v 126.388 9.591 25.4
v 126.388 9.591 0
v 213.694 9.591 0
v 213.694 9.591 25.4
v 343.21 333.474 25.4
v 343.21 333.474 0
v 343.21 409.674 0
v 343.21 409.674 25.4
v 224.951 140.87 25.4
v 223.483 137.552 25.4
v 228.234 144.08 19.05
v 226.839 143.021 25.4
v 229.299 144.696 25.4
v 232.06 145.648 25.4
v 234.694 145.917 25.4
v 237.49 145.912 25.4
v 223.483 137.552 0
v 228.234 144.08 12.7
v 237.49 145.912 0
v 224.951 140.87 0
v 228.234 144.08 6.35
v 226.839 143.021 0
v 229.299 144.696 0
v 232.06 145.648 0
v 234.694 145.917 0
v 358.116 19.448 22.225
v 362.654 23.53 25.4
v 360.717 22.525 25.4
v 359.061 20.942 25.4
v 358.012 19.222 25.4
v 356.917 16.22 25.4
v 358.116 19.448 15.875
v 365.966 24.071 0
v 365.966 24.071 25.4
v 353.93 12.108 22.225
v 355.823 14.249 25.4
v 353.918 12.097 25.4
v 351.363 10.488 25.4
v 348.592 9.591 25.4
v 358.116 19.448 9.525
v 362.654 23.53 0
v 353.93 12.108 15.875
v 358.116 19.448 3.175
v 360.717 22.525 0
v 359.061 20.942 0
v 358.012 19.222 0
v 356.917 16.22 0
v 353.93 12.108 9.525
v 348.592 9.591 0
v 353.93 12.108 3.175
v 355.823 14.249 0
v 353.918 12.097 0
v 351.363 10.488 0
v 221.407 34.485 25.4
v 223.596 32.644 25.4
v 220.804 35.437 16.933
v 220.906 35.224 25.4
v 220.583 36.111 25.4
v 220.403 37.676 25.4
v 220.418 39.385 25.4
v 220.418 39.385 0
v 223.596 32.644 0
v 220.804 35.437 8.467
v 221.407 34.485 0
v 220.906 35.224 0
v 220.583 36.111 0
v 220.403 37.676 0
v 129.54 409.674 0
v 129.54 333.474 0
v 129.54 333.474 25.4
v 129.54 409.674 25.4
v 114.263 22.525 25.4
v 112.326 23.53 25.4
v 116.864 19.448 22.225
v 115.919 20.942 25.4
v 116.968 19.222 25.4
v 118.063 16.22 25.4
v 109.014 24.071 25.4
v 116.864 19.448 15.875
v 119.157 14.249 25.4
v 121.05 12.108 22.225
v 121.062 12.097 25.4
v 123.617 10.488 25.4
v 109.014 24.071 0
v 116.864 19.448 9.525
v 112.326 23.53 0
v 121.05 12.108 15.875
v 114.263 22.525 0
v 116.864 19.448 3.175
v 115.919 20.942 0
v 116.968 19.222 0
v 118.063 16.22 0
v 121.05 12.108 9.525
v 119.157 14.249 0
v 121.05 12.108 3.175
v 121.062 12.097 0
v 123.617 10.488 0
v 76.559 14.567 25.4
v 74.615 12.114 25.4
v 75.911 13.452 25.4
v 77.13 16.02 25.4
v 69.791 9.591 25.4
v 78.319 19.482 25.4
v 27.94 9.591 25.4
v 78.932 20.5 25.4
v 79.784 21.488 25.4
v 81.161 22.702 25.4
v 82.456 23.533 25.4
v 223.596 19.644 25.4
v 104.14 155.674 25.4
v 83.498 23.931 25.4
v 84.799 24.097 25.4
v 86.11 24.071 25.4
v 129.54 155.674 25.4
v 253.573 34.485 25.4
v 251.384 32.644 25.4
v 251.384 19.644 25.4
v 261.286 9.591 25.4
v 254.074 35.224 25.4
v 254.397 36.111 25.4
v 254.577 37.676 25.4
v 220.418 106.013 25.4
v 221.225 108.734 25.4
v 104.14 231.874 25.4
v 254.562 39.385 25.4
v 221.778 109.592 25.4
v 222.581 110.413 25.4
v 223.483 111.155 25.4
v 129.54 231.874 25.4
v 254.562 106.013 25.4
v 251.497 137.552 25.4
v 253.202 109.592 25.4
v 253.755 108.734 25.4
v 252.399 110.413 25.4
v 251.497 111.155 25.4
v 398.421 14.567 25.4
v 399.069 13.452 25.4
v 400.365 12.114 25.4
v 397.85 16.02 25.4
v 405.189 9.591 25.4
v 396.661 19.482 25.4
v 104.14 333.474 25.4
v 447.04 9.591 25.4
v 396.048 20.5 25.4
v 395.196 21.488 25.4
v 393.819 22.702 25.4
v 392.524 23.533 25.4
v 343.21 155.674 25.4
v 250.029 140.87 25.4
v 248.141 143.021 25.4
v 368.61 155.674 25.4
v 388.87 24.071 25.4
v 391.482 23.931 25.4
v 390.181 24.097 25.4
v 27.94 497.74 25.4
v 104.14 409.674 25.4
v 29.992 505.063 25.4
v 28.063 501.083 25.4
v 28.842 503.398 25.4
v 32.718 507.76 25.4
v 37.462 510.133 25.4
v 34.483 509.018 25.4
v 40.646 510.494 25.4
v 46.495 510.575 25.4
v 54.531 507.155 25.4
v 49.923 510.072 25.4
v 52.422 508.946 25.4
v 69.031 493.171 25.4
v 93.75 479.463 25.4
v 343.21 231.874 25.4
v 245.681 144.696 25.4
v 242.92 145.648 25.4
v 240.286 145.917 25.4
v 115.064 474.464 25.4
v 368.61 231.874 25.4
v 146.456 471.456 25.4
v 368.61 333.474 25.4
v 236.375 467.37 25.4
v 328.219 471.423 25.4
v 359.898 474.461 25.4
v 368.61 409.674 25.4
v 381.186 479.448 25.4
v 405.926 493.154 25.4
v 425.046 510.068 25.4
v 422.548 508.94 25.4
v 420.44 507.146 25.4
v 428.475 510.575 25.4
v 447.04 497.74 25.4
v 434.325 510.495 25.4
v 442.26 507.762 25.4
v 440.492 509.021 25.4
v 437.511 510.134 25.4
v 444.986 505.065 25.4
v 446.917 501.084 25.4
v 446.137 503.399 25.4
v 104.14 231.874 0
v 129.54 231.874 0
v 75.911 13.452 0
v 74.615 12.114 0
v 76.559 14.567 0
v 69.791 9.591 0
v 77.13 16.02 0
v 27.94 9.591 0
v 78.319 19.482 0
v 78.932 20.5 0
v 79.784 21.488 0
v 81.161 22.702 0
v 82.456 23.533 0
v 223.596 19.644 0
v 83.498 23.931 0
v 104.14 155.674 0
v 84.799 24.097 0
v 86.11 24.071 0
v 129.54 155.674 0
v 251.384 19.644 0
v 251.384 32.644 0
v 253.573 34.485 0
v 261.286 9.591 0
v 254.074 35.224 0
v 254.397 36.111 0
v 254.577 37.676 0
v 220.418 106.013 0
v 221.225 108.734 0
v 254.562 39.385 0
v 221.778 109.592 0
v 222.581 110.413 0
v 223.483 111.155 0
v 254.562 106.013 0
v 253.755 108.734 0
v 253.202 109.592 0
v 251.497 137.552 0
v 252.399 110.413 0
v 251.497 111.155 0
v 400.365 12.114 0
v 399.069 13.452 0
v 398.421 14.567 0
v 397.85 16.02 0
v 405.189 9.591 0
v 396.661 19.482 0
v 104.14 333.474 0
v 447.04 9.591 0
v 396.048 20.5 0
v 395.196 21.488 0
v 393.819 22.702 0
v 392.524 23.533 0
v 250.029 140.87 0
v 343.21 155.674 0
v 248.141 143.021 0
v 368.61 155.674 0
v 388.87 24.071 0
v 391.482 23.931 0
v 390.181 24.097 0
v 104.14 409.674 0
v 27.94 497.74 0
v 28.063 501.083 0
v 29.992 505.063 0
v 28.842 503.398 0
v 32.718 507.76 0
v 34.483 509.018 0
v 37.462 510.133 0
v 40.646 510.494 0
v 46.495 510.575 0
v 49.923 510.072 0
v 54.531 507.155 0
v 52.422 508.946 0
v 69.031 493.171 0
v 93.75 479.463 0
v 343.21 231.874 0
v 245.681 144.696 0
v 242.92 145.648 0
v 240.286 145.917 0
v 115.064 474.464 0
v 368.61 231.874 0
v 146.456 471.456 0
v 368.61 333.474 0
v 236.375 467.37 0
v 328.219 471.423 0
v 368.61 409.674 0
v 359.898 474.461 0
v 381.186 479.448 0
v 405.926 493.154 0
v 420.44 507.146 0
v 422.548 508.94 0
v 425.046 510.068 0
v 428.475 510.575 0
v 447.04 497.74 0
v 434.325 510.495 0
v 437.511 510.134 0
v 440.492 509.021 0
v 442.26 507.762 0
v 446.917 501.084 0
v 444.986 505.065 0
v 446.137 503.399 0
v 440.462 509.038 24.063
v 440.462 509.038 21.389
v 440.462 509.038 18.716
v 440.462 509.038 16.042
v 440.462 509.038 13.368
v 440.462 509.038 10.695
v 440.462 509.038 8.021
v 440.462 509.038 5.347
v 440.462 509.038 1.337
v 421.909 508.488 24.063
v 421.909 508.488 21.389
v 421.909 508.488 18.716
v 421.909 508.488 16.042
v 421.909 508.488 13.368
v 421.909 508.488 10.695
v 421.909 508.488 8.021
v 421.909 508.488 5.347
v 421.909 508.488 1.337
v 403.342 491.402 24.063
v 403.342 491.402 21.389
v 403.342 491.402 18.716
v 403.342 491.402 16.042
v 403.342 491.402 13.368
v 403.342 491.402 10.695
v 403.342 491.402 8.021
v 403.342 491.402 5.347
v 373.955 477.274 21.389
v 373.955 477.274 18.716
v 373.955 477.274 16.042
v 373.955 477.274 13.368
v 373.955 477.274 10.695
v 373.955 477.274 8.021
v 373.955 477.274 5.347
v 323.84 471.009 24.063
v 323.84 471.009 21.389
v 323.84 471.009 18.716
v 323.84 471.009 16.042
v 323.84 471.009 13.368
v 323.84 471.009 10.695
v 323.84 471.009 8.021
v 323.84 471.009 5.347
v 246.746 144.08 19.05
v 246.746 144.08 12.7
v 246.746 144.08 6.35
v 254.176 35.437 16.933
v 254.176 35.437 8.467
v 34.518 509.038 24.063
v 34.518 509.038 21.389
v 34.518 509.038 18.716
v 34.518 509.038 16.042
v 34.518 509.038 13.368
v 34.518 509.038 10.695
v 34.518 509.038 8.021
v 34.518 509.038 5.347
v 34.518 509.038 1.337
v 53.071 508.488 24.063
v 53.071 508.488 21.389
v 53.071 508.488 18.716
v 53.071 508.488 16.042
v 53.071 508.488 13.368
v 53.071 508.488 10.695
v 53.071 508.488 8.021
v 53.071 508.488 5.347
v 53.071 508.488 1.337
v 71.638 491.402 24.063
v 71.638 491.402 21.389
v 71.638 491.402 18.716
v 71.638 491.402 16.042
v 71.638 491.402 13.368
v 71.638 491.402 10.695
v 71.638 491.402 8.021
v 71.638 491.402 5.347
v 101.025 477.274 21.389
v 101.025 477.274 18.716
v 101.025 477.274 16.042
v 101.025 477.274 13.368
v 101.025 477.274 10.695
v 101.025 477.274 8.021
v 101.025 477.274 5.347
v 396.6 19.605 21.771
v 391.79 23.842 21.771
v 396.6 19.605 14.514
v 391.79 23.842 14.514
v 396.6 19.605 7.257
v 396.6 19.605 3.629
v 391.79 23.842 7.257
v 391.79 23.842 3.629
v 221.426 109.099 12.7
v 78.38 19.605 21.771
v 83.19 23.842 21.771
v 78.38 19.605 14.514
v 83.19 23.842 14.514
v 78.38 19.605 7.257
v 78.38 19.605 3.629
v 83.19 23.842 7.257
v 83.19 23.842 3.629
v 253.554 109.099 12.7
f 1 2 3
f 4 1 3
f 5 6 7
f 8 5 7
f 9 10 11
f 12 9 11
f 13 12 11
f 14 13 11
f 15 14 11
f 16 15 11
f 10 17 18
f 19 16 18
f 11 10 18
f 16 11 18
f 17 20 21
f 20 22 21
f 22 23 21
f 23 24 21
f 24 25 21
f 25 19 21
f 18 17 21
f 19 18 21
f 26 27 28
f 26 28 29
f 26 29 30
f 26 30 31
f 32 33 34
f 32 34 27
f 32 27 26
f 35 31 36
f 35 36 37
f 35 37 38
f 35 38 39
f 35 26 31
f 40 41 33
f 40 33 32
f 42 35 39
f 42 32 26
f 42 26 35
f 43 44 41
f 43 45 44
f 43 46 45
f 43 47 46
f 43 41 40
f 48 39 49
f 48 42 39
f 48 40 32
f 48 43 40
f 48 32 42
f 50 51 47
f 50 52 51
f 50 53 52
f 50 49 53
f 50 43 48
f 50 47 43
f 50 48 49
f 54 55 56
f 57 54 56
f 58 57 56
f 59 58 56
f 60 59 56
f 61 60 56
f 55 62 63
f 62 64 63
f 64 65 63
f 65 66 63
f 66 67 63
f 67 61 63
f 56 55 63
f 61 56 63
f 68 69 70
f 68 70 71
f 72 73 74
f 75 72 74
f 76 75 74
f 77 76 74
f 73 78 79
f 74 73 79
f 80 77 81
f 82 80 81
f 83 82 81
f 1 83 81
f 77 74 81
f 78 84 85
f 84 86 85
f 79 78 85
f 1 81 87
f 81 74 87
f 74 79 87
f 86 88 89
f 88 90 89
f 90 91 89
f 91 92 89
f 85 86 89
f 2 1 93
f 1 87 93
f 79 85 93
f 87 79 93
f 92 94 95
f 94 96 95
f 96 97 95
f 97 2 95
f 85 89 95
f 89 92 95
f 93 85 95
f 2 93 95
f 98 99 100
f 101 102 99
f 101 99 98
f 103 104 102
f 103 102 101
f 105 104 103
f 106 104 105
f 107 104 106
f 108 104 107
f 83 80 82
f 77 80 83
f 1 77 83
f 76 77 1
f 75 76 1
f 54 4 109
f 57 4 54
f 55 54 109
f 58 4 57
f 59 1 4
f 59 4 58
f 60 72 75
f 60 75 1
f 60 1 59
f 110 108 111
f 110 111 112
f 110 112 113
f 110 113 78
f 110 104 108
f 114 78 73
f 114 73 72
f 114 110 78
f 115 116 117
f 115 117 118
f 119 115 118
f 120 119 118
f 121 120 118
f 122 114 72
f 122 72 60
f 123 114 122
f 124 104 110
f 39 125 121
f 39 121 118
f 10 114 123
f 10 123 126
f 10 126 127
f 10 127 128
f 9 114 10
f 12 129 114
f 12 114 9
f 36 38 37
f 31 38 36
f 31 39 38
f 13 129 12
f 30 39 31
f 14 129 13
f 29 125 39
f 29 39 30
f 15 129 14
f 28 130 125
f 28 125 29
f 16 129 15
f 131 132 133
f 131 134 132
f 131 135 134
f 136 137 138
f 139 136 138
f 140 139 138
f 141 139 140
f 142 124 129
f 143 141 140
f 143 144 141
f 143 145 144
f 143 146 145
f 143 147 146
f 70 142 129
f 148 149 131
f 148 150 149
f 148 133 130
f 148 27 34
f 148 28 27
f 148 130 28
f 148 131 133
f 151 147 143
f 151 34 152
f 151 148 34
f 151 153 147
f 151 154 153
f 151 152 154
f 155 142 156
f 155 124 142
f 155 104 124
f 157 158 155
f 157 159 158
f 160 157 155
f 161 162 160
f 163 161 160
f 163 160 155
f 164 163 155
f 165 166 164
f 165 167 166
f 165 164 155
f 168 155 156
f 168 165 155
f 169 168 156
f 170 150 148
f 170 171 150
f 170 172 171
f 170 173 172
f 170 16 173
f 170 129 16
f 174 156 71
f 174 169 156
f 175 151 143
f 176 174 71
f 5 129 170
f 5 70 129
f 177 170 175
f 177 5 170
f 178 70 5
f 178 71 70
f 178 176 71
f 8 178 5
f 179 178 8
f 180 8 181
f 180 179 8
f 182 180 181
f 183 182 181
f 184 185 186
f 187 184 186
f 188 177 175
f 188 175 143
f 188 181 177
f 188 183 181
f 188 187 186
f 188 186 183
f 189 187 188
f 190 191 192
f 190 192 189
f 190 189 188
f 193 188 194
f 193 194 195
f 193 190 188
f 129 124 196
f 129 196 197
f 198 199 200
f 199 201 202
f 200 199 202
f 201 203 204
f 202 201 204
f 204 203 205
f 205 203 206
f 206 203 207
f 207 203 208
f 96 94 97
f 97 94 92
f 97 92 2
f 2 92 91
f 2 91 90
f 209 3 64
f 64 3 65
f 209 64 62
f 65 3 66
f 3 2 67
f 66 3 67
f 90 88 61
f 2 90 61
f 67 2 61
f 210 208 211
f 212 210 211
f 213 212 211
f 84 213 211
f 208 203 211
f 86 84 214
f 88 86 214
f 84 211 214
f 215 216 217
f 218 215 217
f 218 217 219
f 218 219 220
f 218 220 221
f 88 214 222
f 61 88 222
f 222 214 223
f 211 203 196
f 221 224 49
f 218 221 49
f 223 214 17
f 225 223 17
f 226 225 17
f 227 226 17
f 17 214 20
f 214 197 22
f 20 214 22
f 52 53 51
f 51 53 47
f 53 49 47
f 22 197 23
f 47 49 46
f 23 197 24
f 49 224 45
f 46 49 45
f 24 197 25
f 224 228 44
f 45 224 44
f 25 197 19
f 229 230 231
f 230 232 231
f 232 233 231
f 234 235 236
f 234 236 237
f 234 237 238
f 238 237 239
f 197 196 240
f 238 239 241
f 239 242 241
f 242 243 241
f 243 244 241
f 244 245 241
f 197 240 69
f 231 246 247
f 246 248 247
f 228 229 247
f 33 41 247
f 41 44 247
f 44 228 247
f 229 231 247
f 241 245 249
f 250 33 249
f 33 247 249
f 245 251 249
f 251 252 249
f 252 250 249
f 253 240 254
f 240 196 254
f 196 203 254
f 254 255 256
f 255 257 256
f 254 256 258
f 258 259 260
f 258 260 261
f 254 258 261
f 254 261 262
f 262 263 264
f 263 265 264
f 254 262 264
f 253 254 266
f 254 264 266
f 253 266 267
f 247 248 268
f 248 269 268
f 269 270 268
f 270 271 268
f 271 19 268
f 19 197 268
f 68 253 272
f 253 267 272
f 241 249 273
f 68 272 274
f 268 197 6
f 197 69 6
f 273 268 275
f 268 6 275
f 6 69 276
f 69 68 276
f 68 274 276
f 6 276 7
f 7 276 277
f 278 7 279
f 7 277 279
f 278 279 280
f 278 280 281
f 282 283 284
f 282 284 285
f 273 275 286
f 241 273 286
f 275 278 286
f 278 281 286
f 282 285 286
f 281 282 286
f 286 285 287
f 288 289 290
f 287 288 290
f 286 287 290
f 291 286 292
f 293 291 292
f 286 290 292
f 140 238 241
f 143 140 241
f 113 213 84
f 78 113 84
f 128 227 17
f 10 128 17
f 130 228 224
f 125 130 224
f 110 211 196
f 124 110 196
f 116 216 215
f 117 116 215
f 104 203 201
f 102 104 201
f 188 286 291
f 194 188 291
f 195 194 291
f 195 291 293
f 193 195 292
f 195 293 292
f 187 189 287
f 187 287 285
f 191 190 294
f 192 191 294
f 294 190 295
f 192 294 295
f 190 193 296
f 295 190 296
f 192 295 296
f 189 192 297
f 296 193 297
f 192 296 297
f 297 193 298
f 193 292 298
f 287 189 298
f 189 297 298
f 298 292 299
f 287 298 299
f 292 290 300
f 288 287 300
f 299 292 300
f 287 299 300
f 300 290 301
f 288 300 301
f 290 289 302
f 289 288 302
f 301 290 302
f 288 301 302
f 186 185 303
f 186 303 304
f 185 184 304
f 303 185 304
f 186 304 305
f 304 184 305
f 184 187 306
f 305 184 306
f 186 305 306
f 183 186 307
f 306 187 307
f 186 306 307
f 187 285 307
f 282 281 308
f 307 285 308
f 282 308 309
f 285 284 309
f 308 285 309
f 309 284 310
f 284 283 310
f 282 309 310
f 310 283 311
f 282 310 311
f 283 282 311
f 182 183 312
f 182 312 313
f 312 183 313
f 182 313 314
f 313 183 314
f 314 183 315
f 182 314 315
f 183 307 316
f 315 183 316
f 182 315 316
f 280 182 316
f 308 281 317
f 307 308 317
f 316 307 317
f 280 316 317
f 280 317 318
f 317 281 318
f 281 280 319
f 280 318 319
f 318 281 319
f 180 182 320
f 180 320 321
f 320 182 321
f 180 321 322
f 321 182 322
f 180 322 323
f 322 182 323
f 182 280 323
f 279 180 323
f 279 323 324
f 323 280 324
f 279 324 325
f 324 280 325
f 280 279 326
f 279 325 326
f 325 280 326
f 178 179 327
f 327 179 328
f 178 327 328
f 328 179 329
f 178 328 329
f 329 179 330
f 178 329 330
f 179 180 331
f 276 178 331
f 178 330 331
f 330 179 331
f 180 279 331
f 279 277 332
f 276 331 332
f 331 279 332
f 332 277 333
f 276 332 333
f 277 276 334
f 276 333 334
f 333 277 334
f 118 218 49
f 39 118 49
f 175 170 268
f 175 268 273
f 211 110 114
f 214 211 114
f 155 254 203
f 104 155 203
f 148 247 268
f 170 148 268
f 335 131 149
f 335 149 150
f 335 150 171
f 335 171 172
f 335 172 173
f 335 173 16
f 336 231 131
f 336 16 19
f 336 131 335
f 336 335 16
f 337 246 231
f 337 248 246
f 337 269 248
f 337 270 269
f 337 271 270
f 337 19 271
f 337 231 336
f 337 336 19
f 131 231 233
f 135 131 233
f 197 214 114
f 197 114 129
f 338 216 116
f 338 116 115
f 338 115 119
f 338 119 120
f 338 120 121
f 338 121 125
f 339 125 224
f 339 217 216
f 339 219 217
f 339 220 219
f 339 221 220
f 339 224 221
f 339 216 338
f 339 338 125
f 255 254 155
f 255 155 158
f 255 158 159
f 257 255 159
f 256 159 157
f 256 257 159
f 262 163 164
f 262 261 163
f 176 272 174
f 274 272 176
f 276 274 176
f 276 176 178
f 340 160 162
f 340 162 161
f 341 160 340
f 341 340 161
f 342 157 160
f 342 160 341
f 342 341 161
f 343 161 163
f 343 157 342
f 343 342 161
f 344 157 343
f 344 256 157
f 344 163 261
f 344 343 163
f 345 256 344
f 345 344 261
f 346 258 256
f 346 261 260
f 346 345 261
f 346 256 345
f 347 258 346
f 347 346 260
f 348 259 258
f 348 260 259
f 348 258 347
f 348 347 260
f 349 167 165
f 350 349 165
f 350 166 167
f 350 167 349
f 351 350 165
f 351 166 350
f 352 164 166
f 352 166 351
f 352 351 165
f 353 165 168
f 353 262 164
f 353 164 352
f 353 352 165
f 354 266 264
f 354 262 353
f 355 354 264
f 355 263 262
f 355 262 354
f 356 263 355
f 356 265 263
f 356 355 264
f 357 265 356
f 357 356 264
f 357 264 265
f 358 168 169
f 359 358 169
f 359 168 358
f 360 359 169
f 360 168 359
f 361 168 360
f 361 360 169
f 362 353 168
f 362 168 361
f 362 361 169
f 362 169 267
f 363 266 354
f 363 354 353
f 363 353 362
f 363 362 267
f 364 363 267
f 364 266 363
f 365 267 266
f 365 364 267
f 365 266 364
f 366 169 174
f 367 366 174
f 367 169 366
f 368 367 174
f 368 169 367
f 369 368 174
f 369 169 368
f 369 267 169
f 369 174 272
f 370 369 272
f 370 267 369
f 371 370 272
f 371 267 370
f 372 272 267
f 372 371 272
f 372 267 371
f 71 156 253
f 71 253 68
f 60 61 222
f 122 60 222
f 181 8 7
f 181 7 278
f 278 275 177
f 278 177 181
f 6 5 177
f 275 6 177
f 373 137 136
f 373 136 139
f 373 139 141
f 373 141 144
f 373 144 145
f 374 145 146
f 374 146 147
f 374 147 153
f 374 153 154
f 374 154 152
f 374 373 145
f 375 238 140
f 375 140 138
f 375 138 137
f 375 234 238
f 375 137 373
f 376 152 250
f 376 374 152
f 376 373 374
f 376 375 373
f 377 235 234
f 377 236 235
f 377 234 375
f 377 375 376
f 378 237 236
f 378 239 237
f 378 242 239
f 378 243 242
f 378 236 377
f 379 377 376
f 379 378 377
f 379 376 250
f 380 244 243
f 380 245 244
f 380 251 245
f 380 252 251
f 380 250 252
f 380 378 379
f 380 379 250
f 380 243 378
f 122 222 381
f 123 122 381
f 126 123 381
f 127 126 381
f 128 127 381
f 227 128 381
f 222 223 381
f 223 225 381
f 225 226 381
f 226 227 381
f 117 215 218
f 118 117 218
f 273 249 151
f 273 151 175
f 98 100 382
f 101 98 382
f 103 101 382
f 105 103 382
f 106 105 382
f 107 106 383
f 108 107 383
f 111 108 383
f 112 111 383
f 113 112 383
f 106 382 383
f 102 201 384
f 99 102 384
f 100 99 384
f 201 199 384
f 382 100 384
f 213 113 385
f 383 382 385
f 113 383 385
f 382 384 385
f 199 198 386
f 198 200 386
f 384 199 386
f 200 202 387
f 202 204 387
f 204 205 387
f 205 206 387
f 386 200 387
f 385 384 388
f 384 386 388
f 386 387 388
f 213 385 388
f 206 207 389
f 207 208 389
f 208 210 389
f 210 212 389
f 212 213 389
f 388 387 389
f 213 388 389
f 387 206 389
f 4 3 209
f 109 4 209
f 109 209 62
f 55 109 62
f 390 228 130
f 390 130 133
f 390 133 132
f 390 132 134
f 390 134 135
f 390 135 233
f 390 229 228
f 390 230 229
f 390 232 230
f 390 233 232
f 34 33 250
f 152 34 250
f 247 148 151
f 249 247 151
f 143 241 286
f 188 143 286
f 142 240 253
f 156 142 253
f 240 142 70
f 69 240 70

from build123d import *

# Parameters (mm, degrees)
F0_W     = 25.4
F0_H     = 76.2
F1_DEPTH = 25.4


with BuildPart() as f1:
    # F0 (on Top) → F1 (new body)
    with BuildSketch(Plane.XY):
        with BuildLine():
            Line((27.94, 497.7397918701), (27.94, 9.5907943323))
            Line((27.94, 9.5907943323), (69.7911381721, 9.5907943323))
            add(Edge.make_bspline(
                [(69.7911381721, 9.5907943323), (70.9729934459, 10.0835662213), (73.2638391143, 11.0387291523), (76.0531922549, 13.1198589485), (77.3043146801, 16.3095639856), (78.1586914175, 19.7324295036), (80.1648624939, 22.0094954337), (83.083199723, 24.2054748798), (85.1305401259, 24.1147167625), (86.1102715135, 24.0712855011)],
                knots=[0, 0, 0, 0, 0.1523394582, 0.2952867375, 0.4386532905, 0.5842130124, 0.7200812192, 0.8660480616, 1, 1, 1, 1], degree=3))
            Line((86.1102715135, 24.0712855011), (109.0143173933, 24.0712855011))
            add(Edge.make_bspline(
                [(109.0143173933, 24.0712855011), (110.0985186242, 23.9825349885), (112.2560336215, 23.8059251891), (115.0539241878, 22.1631513646), (117.059276202, 19.5356215947), (117.7142664748, 16.750232963), (119.0891647621, 14.1596776932), (120.9462932416, 11.9998702806), (123.6060037354, 10.3262878367), (125.4719582208, 9.8330238716), (126.3882815838, 9.5907943323)],
                knots=[0, 0, 0, 0, 0.1292897071, 0.257281097, 0.3862908082, 0.5077721085, 0.6300219578, 0.7514199544, 0.8779285856, 1, 1, 1, 1], degree=3))
            Line((126.3882815838, 9.5907943323), (213.6941552162, 9.5907943323))
            Line((213.6941552162, 9.5907943323), (223.5962897539, 19.6436345577))
            Line((223.5962897539, 19.6436345577), (223.5962897539, 32.6440893114))
            add(Edge.make_bspline(
                [(223.5962897539, 32.6440893114), (223.2344538971, 32.9036074593), (222.3939650498, 33.5064280612), (220.3058365881, 35.3541948922), (220.3781694251, 37.9445645771), (220.4183936119, 39.3850654364)],
                knots=[0, 0, 0, 0, 0.2512535266, 0.5836231621, 1, 1, 1, 1], degree=3))
            Line((220.4183936119, 39.3850654364), (220.4183936119, 106.0134544969))
            add(Edge.make_bspline(
                [(220.4183936119, 106.0134544969), (220.6545980862, 107.1199368742), (221.1144124211, 109.2739030935), (222.7079380521, 110.5396807066), (223.4828770161, 111.1552342772)],
                knots=[0, 0, 0, 0, 0.5136953251, 1, 1, 1, 1], degree=3))
            Line((223.4828770161, 111.1552342772), (223.4828770161, 137.551933527))
            add(Edge.make_bspline(
                [(223.4828770161, 137.551933527), (223.8918024102, 138.7241605128), (224.7454091098, 141.1711125069), (228.1337150151, 144.3385407224), (232.2183832523, 146.0062063677), (235.6763179785, 145.9443569993), (237.49, 145.9119170904)],
                knots=[0, 0, 0, 0, 0.2304795373, 0.4811119095, 0.7278439081, 1, 1, 1, 1], degree=3))
            add(Edge.make_bspline(
                [(251.4971229839, 137.551933527), (251.0881975898, 138.7241605128), (250.2345908902, 141.1711125069), (246.8462849849, 144.3385407224), (242.7616167477, 146.0062063677), (239.3036820215, 145.9443569993), (237.49, 145.9119170904)],
                knots=[0, 0, 0, 0, 0.2304795373, 0.4811119095, 0.7278439081, 1, 1, 1, 1], degree=3))
            Line((251.4971229839, 137.551933527), (251.4971229839, 111.1552342772))
            add(Edge.make_bspline(
                [(254.5616063881, 106.0134544969), (254.3254019138, 107.1199368742), (253.8655875789, 109.2739030935), (252.2720619479, 110.5396807066), (251.4971229839, 111.1552342772)],
                knots=[0, 0, 0, 0, 0.5136953251, 1, 1, 1, 1], degree=3))
            Line((254.5616063881, 106.0134544969), (254.5616063881, 39.3850654364))
            add(Edge.make_bspline(
                [(251.3837102461, 32.6440893114), (251.7455461029, 32.9036074593), (252.5860349502, 33.5064280612), (254.6741634119, 35.3541948922), (254.6018305749, 37.9445645771), (254.5616063881, 39.3850654364)],
                knots=[0, 0, 0, 0, 0.2512535266, 0.5836231621, 1, 1, 1, 1], degree=3))
            Line((251.3837102461, 32.6440893114), (251.3837102461, 19.6436345577))
            Line((251.3837102461, 19.6436345577), (261.2858447838, 9.5907943323))
            Line((261.2858447838, 9.5907943323), (348.5917184162, 9.5907943323))
            add(Edge.make_bspline(
                [(365.9656826067, 24.0712855011), (364.8814813758, 23.9825349885), (362.7239663785, 23.8059251891), (359.9260758122, 22.1631513646), (357.920723798, 19.5356215947), (357.2657335252, 16.750232963), (355.8908352379, 14.1596776932), (354.0337067584, 11.9998702806), (351.3739962646, 10.3262878367), (349.5080417792, 9.8330238716), (348.5917184162, 9.5907943323)],
                knots=[0, 0, 0, 0, 0.1292897071, 0.257281097, 0.3862908082, 0.5077721085, 0.6300219578, 0.7514199544, 0.8779285856, 1, 1, 1, 1], degree=3))
            Line((365.9656826067, 24.0712855011), (388.8697284865, 24.0712855011))
            add(Edge.make_bspline(
                [(405.1888618279, 9.5907943323), (404.0070065541, 10.0835662213), (401.7161608857, 11.0387291523), (398.9268077451, 13.1198589485), (397.6756853199, 16.3095639856), (396.8213085825, 19.7324295036), (394.8151375061, 22.0094954337), (391.896800277, 24.2054748798), (389.8494598741, 24.1147167625), (388.8697284865, 24.0712855011)],
                knots=[0, 0, 0, 0, 0.1523394582, 0.2952867375, 0.4386532905, 0.5842130124, 0.7200812192, 0.8660480616, 1, 1, 1, 1], degree=3))
            Line((405.1888618279, 9.5907943323), (447.04, 9.5907943323))
            Line((447.04, 9.5907943323), (447.04, 497.7397918701))
            add(Edge.make_bspline(
                [(447.04, 497.7397918701), (447.0840639668, 498.5719456887), (447.1733070187, 500.2573124849), (446.5132567764, 502.8595849038), (445.3671624627, 504.7750376491), (443.7644560307, 506.2486521784), (441.368764259, 508.8320751389), (437.3310840176, 510.4358112402), (432.8457702519, 510.5260285796), (426.2168035945, 510.7873084297), (421.7027027656, 508.7994622807), (418.5730980083, 504.915225787), (414.0058714028, 501.0582603999), (407.335065825, 493.4051783503), (397.7920159871, 488.2989117697), (388.8460524174, 482.0240080075), (373.8033876999, 476.6712378868), (353.5387978077, 473.2515003566), (334.3966924016, 472.1851360377), (305.5635210363, 468.9411513843), (262.4238762665, 467.293202877), (236.3750669765, 467.3699736595)],
                knots=[0, 0, 0, 0, 0.027468304, 0.0556317432, 0.0810607175, 0.1063480068, 0.1385222482, 0.1738825689, 0.2109046748, 0.2552097269, 0.2929197512, 0.3305310296, 0.3727487257, 0.4275786882, 0.4843953058, 0.5410513046, 0.6098091335, 0.6883034128, 0.7627327771, 0.8540965739, 1, 1, 1, 1], degree=3))
            add(Edge.make_bspline(
                [(27.94, 497.7397918701), (27.8958342727, 498.5738674499), (27.8067416397, 500.2563935647), (28.4667314683, 502.8598069048), (29.6128405068, 504.774981567), (31.2155429347, 506.2486717227), (33.6112360768, 508.8320687608), (37.6489158919, 510.4358130998), (42.1342297473, 510.5260279558), (48.7631965411, 510.787308584), (53.2772967914, 508.7994622303), (56.406903741, 504.9152258504), (60.974120218, 501.058260146), (67.6449764752, 493.4051796121), (77.1878214495, 488.2989069253), (86.1346057743, 482.0240276203), (101.1733793918, 476.6711415533), (121.4547784985, 473.2519049004), (140.5312229551, 472.1835840311), (169.5082305233, 468.9742158558), (210.6784056495, 467.2942407239), (236.3750669765, 467.3699736595)],
                knots=[0, 0, 0, 0, 0.0275317388, 0.0557602182, 0.0812479177, 0.106593605, 0.138842149, 0.1742841302, 0.2113917343, 0.2557991037, 0.2935962149, 0.3312943521, 0.373609545, 0.4285661308, 0.4855139597, 0.5423007988, 0.6112174158, 0.6898929685, 0.7644942186, 0.8560690093, 1, 1, 1, 1], degree=3))
        make_face()
        with Locations((116.84, 193.7738674499)):
            Rectangle(F0_W, F0_H, mode=Mode.SUBTRACT)
        with Locations((355.9101339531, 193.7738674499)):
            Rectangle(F0_W, F0_H, mode=Mode.SUBTRACT)
        with Locations((116.84, 371.5738674499)):
            Rectangle(F0_W, F0_H, mode=Mode.SUBTRACT)
        with Locations((355.9101339531, 371.5738674499)):
            Rectangle(F0_W, F0_H, mode=Mode.SUBTRACT)
    extrude(amount=F1_DEPTH)


solid = f1.part
